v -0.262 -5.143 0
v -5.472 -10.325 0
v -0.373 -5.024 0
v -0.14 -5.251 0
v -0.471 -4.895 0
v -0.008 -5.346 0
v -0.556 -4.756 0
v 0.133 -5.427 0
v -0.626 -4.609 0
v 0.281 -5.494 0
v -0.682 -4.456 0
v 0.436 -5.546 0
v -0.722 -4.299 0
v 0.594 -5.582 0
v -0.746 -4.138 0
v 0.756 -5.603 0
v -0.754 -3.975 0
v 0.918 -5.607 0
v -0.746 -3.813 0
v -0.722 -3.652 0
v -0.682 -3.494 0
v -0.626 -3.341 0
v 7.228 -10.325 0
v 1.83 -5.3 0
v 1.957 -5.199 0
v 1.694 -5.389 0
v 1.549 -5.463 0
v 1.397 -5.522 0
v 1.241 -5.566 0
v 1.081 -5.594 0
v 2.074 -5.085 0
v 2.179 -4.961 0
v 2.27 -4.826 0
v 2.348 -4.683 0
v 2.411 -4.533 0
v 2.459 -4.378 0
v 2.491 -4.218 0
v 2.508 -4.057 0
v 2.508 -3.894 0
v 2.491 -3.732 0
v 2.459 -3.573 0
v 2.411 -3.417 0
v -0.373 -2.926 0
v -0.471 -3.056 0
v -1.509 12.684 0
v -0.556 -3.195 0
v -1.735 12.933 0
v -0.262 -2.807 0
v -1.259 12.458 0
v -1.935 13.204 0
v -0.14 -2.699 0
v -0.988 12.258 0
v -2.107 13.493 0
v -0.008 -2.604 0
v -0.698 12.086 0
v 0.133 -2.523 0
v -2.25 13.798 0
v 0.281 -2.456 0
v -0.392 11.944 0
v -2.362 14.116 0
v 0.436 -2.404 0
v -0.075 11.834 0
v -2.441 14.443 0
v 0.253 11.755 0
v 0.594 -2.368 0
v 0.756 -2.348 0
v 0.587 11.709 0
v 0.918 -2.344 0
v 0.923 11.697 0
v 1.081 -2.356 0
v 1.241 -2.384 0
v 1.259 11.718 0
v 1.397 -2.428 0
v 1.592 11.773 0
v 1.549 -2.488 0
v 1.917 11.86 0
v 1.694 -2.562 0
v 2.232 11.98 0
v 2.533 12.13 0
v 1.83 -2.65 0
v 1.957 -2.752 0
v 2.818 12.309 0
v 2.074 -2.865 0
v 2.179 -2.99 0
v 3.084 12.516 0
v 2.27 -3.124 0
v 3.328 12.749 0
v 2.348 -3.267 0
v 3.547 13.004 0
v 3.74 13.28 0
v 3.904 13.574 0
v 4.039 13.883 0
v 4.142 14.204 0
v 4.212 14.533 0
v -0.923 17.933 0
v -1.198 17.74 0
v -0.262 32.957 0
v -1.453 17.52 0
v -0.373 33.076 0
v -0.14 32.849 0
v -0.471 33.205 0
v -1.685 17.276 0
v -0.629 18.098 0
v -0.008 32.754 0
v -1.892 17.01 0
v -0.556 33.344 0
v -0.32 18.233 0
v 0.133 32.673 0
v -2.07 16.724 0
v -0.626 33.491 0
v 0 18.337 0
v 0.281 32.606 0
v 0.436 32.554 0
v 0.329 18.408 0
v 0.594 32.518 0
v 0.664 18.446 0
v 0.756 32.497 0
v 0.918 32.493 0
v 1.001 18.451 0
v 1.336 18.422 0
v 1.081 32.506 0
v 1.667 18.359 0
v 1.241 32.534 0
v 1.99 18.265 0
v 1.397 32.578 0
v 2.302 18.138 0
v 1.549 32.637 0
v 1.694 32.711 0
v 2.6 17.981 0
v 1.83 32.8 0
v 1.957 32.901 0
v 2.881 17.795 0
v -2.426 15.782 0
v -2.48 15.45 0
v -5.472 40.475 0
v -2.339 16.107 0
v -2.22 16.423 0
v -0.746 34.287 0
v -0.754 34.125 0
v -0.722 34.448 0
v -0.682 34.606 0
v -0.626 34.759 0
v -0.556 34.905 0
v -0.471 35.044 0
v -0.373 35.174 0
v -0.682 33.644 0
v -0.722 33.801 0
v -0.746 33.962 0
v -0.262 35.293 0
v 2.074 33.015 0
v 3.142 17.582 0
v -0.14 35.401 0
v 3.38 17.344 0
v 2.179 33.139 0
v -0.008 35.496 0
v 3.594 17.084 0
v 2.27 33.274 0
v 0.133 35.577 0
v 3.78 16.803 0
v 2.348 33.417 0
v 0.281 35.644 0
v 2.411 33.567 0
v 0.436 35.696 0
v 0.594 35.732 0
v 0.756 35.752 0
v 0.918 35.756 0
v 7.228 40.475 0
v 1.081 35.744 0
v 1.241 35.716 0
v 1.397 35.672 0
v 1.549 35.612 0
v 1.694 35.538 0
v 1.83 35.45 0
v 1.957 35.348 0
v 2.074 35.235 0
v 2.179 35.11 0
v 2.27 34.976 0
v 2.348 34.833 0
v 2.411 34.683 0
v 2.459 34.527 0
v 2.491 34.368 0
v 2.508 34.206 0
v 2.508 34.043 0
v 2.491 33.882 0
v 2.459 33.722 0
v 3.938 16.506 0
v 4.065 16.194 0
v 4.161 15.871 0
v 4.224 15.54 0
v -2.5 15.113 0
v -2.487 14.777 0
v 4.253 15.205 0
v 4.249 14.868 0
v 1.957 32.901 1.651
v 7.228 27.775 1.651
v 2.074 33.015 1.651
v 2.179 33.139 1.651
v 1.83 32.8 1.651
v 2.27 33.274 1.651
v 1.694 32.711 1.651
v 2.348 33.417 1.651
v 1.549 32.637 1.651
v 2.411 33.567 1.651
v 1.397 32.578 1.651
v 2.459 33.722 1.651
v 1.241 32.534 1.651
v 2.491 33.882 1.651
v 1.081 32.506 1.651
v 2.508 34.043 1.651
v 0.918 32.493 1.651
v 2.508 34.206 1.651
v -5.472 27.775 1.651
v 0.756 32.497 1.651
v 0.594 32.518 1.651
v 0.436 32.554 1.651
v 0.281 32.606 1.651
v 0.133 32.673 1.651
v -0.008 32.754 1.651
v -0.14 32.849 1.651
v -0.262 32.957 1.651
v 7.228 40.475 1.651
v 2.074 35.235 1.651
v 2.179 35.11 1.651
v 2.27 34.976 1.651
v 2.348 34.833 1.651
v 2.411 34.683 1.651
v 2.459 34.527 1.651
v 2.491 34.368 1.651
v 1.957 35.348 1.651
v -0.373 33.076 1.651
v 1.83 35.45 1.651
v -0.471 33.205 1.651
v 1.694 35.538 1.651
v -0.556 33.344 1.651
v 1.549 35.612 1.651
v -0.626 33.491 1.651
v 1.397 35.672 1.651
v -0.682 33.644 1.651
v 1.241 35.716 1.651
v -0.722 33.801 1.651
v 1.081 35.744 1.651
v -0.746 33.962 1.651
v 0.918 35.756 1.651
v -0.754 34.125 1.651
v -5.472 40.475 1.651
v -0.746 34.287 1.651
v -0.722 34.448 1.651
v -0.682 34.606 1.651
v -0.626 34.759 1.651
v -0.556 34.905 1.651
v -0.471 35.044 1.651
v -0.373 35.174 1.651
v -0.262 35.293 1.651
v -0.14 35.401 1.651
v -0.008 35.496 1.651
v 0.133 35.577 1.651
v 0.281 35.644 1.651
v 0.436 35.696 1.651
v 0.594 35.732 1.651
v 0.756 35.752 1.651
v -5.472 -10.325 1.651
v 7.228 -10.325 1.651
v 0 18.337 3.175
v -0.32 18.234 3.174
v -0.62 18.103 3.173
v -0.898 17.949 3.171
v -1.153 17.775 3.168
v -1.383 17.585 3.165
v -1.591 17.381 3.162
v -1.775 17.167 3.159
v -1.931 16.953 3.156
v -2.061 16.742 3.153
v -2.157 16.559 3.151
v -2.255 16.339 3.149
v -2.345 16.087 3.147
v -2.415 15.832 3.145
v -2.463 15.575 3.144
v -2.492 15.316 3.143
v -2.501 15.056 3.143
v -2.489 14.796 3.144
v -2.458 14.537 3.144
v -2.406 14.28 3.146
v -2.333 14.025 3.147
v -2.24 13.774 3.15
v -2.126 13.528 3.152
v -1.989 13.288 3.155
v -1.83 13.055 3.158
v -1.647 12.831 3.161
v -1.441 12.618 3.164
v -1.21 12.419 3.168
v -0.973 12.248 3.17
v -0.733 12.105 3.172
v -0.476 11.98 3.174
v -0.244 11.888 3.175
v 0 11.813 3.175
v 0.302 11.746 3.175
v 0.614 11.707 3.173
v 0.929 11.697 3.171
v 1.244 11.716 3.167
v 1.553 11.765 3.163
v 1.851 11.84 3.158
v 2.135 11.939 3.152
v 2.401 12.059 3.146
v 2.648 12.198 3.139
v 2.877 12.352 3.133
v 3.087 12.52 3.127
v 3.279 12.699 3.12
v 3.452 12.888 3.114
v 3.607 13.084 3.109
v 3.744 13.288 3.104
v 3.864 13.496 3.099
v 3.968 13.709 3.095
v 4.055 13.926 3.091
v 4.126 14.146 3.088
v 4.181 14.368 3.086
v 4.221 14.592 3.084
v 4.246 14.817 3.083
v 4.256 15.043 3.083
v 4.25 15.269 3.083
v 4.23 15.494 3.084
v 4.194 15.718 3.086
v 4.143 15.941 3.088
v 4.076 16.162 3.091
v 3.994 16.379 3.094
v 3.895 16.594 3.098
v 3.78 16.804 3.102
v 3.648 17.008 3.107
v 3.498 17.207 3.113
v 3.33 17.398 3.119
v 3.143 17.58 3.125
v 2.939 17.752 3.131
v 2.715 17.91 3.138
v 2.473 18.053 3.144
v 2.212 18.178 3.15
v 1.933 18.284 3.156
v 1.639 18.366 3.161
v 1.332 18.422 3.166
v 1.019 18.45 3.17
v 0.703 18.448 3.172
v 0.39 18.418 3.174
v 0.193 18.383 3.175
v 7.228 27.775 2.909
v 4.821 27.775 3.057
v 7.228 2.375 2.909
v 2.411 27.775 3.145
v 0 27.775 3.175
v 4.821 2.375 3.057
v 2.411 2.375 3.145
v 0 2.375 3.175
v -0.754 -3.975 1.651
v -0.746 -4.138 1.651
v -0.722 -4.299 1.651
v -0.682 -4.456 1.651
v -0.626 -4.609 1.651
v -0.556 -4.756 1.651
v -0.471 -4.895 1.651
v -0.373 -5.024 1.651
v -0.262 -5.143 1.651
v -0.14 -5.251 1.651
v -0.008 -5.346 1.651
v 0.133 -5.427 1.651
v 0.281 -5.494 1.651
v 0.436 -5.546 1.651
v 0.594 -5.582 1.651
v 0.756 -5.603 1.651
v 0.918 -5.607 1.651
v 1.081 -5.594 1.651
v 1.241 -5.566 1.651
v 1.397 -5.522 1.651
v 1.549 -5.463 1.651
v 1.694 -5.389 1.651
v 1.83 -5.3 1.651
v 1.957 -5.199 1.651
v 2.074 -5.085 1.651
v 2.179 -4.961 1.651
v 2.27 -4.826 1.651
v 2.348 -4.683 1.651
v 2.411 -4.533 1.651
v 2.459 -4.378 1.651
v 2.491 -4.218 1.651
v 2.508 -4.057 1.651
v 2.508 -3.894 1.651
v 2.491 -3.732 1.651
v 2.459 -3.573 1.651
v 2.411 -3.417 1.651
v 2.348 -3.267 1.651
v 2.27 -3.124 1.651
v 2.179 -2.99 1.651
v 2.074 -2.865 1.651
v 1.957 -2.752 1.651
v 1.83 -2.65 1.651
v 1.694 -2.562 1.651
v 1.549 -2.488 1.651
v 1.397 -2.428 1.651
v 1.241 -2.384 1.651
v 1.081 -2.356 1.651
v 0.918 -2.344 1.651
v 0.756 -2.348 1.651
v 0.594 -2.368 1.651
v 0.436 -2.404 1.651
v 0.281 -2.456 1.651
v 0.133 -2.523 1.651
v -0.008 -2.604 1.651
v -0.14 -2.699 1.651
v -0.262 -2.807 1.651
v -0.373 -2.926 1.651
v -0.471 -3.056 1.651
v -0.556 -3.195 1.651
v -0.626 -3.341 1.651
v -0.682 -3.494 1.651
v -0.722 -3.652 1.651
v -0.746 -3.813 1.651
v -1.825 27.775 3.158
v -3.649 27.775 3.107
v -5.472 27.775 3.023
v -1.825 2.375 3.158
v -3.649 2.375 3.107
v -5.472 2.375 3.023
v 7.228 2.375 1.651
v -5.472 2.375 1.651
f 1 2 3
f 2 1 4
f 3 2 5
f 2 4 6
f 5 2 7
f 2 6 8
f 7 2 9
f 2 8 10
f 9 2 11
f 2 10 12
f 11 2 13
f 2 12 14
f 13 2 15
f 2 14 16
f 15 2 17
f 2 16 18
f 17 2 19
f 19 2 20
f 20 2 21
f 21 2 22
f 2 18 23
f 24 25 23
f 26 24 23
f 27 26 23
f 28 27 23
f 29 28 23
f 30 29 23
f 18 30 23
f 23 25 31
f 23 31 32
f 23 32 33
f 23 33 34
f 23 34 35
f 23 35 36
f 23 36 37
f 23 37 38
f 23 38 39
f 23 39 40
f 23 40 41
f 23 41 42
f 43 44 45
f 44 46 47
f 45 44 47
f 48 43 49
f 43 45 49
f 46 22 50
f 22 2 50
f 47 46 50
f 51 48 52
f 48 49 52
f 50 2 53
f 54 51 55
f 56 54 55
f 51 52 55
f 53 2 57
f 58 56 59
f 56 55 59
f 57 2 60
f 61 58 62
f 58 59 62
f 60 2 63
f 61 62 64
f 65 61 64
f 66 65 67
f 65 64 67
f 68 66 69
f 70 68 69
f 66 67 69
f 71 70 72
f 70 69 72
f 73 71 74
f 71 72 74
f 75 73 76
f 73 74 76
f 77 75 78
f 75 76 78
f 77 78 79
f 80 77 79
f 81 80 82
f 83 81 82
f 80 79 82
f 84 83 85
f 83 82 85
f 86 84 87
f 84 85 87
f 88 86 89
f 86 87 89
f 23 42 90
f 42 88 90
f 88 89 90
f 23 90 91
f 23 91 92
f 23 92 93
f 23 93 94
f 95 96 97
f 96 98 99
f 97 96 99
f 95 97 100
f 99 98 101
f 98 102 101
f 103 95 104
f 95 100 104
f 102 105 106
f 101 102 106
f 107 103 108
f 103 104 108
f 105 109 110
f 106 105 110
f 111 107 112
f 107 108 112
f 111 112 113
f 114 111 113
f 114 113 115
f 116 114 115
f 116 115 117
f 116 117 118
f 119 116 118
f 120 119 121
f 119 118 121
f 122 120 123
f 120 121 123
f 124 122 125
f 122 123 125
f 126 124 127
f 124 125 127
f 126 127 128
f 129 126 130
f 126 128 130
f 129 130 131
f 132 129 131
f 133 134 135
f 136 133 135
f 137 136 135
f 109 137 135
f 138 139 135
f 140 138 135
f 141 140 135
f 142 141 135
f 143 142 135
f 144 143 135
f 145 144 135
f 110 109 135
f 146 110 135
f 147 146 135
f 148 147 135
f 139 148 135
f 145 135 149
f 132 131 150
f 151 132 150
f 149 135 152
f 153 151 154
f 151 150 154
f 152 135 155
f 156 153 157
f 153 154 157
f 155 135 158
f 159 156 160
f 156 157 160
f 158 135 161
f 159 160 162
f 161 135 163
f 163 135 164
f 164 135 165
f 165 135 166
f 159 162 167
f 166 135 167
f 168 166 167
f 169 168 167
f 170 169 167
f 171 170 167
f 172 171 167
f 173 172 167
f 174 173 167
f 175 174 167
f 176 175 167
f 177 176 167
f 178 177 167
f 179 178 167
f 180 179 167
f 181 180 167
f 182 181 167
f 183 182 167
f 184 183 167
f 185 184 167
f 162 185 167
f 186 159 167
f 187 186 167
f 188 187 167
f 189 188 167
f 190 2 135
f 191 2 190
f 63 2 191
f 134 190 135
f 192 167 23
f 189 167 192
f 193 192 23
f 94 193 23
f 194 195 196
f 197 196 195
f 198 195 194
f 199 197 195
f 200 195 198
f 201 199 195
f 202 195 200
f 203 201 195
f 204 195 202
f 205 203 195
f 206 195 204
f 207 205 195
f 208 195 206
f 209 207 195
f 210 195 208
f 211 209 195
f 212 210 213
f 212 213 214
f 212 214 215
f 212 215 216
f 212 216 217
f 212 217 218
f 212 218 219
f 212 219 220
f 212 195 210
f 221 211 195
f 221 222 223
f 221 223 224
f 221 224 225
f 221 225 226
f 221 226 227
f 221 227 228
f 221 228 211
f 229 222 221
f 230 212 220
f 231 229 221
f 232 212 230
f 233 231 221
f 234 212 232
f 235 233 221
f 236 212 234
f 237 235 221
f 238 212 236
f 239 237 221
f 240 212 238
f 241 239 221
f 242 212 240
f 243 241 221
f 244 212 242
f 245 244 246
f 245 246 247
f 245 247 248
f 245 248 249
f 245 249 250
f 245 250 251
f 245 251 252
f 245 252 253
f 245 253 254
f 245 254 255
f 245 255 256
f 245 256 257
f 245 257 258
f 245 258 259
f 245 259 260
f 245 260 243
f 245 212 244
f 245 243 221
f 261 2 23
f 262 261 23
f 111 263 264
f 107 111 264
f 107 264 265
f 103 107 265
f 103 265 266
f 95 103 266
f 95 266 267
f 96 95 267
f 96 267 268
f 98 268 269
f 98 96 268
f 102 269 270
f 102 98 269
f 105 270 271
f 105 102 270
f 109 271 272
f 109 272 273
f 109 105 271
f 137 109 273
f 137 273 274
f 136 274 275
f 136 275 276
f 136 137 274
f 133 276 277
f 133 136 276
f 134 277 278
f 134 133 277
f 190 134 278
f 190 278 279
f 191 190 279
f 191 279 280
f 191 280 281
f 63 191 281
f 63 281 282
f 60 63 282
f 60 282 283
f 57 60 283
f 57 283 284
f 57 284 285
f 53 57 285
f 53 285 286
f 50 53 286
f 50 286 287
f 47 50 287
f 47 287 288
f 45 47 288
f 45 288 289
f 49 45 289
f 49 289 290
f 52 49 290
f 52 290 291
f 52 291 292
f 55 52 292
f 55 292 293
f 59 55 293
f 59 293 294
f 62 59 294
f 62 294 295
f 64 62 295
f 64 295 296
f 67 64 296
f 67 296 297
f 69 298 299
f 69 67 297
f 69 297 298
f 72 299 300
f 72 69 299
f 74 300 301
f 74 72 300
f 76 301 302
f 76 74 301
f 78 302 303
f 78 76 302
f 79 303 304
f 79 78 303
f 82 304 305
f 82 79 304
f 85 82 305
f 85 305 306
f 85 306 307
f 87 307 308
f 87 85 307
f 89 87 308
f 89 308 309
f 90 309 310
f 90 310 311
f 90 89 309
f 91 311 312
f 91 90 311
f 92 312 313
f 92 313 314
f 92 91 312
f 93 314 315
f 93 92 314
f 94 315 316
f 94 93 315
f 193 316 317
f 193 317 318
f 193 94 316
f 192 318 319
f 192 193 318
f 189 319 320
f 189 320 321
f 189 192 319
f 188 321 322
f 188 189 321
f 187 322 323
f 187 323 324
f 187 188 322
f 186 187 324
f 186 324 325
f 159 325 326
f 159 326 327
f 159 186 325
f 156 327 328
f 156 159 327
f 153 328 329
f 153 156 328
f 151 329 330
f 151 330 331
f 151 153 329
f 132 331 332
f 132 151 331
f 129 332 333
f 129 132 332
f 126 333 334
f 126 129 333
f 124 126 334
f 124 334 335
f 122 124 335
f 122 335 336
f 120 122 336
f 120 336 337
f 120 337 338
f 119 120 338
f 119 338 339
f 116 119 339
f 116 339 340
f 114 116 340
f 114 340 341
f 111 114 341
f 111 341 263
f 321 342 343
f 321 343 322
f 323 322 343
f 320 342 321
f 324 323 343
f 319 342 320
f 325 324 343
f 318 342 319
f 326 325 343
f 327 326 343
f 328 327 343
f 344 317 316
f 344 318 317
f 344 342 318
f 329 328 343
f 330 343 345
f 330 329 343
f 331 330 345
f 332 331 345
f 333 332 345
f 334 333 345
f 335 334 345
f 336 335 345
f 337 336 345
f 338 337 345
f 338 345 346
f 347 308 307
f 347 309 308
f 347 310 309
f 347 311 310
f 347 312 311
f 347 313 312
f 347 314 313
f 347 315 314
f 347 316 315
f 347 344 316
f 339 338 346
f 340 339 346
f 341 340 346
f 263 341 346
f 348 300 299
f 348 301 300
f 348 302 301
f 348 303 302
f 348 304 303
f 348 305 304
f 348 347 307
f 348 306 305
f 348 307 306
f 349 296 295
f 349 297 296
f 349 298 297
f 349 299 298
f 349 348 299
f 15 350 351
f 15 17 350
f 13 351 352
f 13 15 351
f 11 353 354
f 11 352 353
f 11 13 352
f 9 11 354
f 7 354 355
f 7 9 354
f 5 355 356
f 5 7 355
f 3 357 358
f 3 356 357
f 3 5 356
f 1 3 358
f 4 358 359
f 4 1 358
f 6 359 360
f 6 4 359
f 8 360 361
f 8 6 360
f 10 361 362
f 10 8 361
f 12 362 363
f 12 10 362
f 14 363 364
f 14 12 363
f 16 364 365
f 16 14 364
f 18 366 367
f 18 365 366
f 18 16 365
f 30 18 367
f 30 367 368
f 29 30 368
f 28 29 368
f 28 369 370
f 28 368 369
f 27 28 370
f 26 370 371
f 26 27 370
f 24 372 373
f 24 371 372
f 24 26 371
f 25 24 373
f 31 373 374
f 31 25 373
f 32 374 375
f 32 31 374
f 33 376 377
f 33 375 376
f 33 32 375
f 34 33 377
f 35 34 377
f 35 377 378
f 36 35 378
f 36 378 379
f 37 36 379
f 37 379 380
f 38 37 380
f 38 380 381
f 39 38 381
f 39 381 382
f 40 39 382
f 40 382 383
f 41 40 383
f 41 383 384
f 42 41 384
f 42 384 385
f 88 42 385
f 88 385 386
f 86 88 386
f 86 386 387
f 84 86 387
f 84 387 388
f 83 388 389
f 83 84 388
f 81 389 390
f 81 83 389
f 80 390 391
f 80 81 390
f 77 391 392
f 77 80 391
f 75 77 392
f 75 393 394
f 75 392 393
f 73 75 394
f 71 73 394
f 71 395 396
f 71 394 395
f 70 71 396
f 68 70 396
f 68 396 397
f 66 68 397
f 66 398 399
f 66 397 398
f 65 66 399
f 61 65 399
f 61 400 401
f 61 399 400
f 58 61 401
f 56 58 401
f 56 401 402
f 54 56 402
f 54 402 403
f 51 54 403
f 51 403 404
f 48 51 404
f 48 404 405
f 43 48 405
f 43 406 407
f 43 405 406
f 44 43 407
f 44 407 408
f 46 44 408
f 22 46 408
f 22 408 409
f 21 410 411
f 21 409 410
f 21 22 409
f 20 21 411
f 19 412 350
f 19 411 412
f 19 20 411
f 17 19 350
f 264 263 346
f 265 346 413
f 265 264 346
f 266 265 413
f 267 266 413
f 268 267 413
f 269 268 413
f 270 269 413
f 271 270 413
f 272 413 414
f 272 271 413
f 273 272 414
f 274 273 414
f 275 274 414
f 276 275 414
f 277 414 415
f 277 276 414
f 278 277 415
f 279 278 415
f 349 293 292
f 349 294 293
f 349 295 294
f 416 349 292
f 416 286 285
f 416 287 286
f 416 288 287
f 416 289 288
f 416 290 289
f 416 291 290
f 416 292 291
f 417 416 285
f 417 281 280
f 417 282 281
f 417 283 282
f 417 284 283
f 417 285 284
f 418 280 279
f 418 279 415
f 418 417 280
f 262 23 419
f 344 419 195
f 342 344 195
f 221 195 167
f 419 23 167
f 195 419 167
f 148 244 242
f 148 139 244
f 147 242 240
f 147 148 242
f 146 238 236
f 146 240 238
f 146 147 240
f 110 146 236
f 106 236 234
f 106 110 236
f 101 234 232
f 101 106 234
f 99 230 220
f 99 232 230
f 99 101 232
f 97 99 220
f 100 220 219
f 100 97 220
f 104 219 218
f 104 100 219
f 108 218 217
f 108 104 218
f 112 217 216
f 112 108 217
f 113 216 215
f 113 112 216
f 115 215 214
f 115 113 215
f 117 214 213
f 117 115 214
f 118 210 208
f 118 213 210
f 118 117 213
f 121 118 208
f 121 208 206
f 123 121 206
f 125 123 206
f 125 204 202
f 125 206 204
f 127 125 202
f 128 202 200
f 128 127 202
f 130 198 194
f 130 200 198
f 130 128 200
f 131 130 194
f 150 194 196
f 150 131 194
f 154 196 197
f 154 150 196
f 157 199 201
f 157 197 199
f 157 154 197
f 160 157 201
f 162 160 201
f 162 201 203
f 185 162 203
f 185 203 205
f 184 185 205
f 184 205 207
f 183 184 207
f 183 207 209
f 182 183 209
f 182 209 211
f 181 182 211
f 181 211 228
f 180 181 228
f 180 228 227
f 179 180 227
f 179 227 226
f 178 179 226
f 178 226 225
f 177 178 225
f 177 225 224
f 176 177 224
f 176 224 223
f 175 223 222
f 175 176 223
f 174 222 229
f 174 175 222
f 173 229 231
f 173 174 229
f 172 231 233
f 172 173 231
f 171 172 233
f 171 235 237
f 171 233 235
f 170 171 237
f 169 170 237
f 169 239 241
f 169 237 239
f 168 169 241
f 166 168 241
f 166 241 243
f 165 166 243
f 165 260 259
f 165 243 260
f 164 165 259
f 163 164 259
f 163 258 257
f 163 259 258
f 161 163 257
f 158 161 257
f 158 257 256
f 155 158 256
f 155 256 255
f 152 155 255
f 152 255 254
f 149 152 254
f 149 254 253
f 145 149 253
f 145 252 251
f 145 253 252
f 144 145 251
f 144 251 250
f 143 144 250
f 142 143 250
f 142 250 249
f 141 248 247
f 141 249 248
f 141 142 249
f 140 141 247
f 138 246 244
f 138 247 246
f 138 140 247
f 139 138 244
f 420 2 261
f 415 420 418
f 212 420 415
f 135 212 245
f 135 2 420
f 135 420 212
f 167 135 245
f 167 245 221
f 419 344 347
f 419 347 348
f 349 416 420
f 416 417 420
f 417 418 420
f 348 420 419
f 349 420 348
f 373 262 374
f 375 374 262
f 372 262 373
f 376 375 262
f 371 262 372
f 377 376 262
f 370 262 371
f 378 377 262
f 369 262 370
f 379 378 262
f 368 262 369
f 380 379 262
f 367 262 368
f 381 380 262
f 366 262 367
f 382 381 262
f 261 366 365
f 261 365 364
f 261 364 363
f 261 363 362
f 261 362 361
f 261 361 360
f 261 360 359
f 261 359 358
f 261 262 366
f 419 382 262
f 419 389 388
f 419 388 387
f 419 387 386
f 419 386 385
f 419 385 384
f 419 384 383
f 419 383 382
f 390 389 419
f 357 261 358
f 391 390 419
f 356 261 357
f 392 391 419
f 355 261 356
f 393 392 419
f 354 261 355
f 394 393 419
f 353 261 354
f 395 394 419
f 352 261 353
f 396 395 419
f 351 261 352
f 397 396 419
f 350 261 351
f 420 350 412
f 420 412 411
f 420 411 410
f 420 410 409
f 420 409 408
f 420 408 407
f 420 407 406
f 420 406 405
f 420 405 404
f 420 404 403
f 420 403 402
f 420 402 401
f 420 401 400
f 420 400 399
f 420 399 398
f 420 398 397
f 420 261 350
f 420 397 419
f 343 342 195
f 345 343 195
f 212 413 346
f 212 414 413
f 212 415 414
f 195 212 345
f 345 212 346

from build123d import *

# Parameters (mm, degrees)
SKETCH1_W                = 12.7
SKETCH1_H                = 50.8
BOSS_EXTRUDE1_DEPTH      = 3.175
CUT_EXTRUDE1_DEPTH       = 42.237466092
CUT_EXTRUDE1_DEPTH_BACK  = 42.237466092
SKETCH4_W                = 1.524
SKETCH4_H                = 12.7
CUT_EXTRUDE9_START       = 2.374796748
CUT_EXTRUDE9_DEPTH       = 25.4
CUT_EXTRUDE15_DEPTH      = 42.237466092
CUT_EXTRUDE15_DEPTH_BACK = 2.54
SKETCH7_R                = 1.63195
SKETCH7_R_2              = 3.3782


# Read off the part's stored shape, not the designer's step: Cut-Extrude9
with BuildPart() as part:
    # Sketch1 → Boss-Extrude1 (new body)
    with BuildSketch(Plane.XY):
        with Locations((0.877642276, 15.074796748)):
            Rectangle(SKETCH1_W, SKETCH1_H)
    extrude(amount=BOSS_EXTRUDE1_DEPTH)

    # Sketch4 → Cut-Extrude1 (cut, two sides: drawn at the far end of the back side and taken through both)
    with BuildSketch(Plane(origin=(0, 0, 0), x_dir=(0, 0, -1), z_dir=(1, 0, 0)).offset(-CUT_EXTRUDE1_DEPTH_BACK)):
        with Locations((-2.413, 34.124796748)):
            Rectangle(SKETCH4_W, SKETCH4_H)
        with Locations((-2.413, -3.975203252)):
            Rectangle(SKETCH4_W, SKETCH4_H)
    extrude(amount=CUT_EXTRUDE1_DEPTH + CUT_EXTRUDE1_DEPTH_BACK, mode=Mode.SUBTRACT)

    # Cut-Extrude9 outline → Cut-Extrude9 (cut)
    with BuildSketch(Plane(origin=(0, 0, 0), x_dir=(1, 0, 0), z_dir=(0, 1, 0)).offset(CUT_EXTRUDE9_START)):
        with BuildLine():
            ThreePointArc((7.227642276, -2.909267581), (3.616263069, -3.10854445), (5.36e-07, -3.175))
            Line((5.36e-07, -3.175), (7.227642276, -3.175))
            Line((7.227642276, -3.175), (7.227642276, -2.909267581))
        make_face()
        with BuildLine():
            ThreePointArc((5.36e-07, -3.175), (-2.737237313, -3.136930824), (-5.472357724, -3.022752714))
            Line((-5.472357724, -3.022752714), (-5.472357724, -3.175))
            Line((-5.472357724, -3.175), (5.36e-07, -3.175))
        make_face()
    extrude(amount=CUT_EXTRUDE9_DEPTH, mode=Mode.SUBTRACT)

    # Sketch7 → Cut-Extrude15 (cut, two sides: drawn at the far end of the back side and taken through both)
    with BuildSketch(Plane.XY.offset(-CUT_EXTRUDE15_DEPTH_BACK)):
        with Locations(Location((0.877642276, -3.975203252, 0), (0, 0, 180))):
            Circle(SKETCH7_R)
        with Locations(Location((0.877642276, 34.124796748, 0), (0, 0, 180))):
            Circle(SKETCH7_R)
        with Locations(Location((0.877642276, 15.074796748, 0), (0, 0, 105.05794783))):
            Circle(SKETCH7_R_2)
    extrude(amount=CUT_EXTRUDE15_DEPTH + CUT_EXTRUDE15_DEPTH_BACK, mode=Mode.SUBTRACT)


solid = part.part
